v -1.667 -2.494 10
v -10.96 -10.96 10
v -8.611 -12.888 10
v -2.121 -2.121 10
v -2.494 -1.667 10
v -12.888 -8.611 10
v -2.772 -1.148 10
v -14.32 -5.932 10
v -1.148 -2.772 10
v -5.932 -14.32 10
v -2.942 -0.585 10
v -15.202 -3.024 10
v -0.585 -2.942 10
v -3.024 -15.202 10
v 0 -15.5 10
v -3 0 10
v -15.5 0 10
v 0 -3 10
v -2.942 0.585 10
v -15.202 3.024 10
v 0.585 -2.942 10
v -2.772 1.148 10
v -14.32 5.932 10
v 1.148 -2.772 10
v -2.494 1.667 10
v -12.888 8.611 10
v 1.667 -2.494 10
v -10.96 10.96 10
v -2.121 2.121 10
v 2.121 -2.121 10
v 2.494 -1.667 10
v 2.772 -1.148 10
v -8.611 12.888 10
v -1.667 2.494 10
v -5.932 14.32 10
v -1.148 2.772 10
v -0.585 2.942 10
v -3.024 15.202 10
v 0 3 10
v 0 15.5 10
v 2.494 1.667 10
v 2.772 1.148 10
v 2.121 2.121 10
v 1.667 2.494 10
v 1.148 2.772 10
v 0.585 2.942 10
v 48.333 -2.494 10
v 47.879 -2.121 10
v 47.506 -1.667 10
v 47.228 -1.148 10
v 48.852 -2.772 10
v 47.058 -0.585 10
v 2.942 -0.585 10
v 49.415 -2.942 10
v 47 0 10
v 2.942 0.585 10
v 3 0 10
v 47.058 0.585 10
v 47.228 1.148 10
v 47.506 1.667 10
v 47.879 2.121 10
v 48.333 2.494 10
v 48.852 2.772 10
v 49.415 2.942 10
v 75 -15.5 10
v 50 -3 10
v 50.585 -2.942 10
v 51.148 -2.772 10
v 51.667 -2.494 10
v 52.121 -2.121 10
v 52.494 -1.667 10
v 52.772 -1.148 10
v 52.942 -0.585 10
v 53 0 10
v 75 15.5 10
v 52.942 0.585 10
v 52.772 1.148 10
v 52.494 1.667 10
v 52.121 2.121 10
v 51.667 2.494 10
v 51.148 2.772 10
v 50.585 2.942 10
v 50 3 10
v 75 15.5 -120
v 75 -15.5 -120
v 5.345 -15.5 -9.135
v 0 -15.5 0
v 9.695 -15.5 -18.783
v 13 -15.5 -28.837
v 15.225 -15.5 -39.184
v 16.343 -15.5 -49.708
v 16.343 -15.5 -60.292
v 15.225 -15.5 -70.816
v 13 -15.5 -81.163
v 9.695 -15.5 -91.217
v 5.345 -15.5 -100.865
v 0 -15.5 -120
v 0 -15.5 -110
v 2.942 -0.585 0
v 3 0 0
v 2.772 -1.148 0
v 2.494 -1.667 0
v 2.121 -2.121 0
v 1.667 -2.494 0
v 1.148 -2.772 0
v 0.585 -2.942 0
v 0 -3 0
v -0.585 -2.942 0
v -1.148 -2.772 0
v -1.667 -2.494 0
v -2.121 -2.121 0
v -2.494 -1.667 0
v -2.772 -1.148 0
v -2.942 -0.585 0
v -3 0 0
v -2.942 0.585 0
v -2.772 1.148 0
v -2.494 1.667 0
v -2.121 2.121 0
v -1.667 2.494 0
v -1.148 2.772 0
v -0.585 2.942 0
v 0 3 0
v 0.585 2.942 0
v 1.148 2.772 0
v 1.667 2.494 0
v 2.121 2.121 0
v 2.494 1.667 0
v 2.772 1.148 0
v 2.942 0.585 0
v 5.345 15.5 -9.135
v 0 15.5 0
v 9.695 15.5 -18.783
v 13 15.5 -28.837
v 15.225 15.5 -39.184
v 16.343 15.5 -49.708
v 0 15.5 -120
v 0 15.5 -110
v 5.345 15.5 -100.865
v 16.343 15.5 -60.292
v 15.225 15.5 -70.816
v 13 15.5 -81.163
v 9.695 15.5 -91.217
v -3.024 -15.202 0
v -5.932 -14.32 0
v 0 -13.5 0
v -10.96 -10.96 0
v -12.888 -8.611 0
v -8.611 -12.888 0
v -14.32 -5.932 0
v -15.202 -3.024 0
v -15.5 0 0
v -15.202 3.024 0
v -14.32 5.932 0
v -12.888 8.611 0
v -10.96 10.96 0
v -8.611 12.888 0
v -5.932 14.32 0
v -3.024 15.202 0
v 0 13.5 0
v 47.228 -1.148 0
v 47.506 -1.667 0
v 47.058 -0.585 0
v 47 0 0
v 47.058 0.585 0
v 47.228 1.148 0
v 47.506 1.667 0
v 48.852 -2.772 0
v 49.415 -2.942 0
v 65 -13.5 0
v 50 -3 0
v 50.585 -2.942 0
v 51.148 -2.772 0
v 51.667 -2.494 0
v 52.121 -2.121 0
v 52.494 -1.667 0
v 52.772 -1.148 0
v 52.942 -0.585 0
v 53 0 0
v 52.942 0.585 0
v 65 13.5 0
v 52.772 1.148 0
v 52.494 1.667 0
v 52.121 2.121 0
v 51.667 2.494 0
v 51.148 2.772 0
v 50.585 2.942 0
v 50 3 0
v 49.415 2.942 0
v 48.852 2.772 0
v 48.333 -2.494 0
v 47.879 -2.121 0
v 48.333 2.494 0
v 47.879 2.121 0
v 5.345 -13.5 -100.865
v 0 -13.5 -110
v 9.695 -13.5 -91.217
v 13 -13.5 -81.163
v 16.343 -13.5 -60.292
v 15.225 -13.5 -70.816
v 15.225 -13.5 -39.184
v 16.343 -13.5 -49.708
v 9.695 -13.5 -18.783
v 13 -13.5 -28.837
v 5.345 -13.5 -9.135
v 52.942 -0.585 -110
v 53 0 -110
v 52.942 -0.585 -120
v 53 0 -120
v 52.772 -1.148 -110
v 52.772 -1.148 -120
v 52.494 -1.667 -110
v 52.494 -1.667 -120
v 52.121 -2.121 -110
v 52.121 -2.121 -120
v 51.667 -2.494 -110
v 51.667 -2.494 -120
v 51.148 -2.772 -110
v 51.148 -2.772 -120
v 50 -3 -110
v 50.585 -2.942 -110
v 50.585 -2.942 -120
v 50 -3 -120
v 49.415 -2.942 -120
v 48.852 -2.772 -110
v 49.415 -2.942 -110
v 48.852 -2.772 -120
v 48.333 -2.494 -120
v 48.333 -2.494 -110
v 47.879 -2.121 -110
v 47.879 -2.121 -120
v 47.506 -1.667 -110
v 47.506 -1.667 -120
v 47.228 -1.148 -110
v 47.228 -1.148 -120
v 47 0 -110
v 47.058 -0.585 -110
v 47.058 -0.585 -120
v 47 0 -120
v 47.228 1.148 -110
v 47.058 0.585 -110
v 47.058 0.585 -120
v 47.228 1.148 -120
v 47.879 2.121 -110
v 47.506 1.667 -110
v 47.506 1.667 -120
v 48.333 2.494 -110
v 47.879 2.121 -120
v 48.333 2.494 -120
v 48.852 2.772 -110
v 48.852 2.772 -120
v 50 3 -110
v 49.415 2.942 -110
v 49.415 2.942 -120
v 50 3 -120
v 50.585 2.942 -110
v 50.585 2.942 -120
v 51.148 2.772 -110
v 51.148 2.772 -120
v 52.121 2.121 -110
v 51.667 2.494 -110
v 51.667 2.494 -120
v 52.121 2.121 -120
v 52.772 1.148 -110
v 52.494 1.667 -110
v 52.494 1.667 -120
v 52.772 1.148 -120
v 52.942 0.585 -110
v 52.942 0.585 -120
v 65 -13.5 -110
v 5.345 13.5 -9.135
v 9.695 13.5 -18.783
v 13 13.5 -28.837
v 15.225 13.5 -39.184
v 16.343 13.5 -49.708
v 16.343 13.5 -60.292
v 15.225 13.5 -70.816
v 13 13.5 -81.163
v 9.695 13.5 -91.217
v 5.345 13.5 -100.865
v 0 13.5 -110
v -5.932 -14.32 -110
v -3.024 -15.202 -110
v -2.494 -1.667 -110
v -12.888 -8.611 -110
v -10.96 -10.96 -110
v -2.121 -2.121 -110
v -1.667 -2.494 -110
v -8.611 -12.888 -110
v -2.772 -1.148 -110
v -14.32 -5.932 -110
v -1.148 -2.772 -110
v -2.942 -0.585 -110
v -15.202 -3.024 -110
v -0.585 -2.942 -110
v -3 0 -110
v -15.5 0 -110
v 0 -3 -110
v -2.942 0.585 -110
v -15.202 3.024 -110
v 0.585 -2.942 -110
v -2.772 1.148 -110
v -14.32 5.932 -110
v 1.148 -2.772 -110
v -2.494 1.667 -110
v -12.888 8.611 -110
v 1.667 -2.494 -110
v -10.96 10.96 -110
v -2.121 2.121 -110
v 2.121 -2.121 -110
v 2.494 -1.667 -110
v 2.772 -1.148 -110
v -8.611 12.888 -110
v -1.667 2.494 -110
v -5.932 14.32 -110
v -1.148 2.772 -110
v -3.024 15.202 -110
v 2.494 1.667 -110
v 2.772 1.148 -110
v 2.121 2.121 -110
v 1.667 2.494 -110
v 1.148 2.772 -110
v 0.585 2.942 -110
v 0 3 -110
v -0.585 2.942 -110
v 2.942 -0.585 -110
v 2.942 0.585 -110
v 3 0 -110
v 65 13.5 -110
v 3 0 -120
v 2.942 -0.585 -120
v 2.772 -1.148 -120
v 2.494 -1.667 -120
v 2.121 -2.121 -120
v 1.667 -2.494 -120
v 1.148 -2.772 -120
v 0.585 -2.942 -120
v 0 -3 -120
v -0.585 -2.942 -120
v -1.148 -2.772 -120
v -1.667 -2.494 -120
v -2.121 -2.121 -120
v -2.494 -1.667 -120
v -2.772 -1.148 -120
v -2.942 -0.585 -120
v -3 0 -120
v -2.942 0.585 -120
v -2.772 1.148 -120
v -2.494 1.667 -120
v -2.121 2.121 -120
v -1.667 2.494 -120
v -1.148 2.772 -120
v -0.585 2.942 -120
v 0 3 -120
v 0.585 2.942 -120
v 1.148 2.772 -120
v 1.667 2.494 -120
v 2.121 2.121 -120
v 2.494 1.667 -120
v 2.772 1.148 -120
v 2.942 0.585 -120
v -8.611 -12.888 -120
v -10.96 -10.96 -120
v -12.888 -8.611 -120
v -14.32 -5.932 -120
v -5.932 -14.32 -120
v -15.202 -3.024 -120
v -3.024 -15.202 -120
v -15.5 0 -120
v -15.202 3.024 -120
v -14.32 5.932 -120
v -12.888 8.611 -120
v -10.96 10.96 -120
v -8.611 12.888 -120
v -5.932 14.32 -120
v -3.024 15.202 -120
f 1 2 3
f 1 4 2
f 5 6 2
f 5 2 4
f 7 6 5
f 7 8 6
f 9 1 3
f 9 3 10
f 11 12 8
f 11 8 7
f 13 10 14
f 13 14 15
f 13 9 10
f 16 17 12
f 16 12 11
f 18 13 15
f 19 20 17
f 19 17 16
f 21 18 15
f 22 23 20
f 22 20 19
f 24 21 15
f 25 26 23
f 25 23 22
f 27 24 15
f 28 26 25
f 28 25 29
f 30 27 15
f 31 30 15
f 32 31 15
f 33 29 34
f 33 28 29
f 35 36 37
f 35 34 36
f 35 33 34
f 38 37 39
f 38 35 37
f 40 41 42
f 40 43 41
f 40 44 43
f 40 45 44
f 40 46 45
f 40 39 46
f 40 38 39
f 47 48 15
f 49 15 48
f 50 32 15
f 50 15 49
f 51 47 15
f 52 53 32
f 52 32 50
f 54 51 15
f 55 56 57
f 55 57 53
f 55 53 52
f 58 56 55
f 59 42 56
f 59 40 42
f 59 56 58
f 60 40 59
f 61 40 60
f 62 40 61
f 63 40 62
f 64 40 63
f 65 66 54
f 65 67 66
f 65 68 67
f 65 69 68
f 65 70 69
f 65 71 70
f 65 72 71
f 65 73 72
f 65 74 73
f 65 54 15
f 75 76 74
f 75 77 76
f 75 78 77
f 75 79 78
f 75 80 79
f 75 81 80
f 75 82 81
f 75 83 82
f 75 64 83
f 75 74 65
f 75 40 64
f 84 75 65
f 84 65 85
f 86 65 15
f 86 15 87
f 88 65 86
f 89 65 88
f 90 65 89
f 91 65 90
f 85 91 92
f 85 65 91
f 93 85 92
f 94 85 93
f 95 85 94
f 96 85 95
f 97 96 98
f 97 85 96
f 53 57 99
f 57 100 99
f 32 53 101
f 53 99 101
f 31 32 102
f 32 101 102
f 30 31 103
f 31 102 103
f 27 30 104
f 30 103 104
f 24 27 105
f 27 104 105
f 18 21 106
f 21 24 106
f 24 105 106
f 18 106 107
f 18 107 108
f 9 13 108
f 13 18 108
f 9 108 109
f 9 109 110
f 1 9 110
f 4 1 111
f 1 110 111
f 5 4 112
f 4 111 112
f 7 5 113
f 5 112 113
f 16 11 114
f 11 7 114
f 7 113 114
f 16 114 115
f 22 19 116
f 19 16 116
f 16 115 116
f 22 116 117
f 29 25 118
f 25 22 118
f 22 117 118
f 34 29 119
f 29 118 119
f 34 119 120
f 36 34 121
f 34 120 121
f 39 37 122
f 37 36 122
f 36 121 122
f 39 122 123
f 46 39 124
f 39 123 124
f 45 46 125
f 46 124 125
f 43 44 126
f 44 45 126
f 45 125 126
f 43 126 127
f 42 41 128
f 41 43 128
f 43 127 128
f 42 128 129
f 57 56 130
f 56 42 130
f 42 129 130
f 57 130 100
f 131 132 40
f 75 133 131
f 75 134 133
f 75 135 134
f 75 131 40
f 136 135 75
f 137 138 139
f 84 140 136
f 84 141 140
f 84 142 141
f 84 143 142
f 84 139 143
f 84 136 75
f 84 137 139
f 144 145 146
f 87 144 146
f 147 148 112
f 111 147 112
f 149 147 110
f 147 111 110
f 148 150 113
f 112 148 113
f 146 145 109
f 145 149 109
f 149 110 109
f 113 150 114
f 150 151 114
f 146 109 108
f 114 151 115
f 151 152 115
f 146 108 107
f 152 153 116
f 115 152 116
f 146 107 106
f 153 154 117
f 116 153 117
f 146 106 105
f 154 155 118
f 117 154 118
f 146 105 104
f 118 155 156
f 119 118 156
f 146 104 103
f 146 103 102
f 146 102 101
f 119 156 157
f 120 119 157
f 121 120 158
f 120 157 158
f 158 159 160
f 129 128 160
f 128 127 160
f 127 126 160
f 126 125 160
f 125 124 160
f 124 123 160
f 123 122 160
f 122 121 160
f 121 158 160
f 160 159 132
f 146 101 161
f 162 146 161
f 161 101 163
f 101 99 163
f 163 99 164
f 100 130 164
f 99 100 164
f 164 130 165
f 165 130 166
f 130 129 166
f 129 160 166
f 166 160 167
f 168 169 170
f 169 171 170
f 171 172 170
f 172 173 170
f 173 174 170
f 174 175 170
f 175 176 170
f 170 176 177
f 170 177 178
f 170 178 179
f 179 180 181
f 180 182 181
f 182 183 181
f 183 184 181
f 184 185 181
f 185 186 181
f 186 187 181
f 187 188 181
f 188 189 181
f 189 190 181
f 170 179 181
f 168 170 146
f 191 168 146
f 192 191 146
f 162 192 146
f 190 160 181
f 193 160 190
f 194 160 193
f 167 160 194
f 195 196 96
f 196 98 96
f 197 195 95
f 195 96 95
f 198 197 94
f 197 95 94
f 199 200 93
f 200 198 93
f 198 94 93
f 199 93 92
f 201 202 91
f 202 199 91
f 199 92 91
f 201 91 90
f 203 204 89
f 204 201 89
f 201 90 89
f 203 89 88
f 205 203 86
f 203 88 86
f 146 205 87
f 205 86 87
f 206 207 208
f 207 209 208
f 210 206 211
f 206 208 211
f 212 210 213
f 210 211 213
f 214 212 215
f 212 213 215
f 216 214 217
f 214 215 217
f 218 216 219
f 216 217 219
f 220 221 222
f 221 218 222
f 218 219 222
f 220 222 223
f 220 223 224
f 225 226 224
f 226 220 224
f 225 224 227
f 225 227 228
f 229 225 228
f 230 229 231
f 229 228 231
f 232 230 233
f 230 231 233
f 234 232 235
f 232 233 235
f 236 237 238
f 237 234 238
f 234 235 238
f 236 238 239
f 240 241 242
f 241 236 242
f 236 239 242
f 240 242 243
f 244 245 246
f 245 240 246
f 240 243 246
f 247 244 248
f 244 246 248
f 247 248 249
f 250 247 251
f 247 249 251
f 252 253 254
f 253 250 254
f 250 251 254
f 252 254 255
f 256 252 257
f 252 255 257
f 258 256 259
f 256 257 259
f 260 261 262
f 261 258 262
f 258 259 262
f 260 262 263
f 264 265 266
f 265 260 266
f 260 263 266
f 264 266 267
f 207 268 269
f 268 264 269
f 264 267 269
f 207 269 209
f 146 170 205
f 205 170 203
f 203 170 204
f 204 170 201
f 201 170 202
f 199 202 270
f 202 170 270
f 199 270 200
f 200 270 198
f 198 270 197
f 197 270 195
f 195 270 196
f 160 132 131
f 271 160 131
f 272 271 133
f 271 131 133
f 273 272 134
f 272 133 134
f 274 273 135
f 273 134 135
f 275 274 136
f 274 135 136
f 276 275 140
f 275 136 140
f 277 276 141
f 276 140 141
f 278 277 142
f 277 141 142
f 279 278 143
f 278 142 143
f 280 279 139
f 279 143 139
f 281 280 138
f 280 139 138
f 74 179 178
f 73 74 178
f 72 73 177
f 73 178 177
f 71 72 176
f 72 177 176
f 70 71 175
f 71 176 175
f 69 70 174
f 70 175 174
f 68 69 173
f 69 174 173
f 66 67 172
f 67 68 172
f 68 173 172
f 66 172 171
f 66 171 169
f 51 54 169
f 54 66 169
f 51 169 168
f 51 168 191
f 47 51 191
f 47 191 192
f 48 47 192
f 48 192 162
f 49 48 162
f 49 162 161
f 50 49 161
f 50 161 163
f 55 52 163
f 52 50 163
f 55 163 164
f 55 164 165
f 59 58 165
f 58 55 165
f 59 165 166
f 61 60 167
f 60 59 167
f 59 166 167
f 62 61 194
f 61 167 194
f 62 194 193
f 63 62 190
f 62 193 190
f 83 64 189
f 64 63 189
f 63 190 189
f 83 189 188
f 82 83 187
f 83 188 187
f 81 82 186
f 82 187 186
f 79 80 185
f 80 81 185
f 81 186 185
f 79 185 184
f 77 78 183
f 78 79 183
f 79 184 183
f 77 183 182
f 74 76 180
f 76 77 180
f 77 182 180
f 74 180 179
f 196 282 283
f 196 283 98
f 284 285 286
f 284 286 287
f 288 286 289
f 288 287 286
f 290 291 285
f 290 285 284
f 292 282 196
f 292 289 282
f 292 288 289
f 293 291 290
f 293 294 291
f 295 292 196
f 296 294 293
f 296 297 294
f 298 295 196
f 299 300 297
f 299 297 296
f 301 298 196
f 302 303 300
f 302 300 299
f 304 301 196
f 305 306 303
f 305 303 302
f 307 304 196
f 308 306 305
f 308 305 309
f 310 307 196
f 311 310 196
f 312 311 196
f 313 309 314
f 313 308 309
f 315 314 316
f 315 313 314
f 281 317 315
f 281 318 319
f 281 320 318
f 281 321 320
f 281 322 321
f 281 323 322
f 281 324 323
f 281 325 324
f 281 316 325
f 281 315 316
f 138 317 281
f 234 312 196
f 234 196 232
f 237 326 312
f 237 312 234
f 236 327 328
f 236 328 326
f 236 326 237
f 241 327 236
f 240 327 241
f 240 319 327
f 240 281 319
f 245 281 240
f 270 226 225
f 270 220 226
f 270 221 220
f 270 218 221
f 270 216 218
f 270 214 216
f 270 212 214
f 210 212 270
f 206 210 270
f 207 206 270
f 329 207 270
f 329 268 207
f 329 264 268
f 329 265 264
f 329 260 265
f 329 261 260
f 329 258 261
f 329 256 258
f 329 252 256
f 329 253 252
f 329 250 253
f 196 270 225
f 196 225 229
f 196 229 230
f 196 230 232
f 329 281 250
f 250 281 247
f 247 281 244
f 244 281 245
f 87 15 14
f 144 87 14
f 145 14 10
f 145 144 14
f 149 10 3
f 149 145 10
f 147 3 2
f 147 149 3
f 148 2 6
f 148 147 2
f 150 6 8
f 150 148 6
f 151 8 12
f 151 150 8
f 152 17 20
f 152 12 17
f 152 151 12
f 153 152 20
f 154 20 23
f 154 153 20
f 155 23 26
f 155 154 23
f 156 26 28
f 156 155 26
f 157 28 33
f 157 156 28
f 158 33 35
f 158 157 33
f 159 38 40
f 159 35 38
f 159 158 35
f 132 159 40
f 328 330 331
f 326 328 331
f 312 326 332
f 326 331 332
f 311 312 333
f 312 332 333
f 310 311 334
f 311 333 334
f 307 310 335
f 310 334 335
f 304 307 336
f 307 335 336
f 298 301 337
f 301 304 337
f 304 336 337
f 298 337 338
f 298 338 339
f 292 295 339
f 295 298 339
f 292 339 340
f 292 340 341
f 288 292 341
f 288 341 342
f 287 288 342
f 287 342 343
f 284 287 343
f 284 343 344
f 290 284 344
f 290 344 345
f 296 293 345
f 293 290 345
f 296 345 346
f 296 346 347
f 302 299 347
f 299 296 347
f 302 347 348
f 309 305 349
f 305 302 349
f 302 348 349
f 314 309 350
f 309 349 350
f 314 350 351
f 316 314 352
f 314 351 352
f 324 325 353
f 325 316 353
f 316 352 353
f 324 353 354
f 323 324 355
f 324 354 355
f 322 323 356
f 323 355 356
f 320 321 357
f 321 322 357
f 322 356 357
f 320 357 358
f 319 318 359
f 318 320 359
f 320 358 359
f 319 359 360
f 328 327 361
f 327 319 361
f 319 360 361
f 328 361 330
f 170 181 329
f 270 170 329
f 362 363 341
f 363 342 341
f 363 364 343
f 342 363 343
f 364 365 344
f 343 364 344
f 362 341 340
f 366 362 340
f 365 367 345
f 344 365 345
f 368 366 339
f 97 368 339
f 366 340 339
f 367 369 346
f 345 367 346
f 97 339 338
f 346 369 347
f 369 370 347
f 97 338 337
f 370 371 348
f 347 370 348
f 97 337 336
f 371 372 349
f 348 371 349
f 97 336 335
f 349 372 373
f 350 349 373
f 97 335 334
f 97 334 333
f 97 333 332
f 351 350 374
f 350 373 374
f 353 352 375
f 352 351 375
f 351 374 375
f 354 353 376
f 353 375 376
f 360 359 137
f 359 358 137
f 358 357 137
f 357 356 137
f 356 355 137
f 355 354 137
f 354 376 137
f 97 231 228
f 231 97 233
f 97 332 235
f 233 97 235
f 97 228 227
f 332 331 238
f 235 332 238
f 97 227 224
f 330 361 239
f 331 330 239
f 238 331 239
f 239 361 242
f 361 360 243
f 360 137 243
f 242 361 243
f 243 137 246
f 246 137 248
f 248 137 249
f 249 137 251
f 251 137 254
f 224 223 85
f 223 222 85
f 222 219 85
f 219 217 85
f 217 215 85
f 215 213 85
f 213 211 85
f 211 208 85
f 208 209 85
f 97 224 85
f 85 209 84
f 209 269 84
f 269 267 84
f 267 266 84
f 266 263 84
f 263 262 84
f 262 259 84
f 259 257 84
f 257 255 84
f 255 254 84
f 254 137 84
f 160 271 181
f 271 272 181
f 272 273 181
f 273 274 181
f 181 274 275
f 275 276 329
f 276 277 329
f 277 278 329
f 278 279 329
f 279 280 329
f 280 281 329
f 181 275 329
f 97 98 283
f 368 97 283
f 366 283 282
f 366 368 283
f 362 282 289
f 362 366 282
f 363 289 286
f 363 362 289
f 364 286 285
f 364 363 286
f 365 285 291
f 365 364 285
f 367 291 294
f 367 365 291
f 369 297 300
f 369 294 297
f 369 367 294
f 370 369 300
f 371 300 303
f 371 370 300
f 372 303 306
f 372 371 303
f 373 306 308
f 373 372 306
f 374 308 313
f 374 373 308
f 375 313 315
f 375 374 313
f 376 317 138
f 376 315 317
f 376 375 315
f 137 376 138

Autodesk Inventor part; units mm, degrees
ref_plane "YZ Plane" through (0, 0, 0) normal (1, 0, 0) x (0, 1, 0)
ref_plane "XZ Plane" through (0, 0, 0) normal (0, 1, 0) x (-1, 0, 0)
ref_plane "XY Plane" through (0, 0, 0) normal (0, 0, 1) x (1, 0, 0)
sketch "Sketch1" plane through (0, 0, 0) normal (0, 0, 1) x (1, 0, 0)
  circle A0 centre (0, 0) radius 3
  circle A1 centre (50, 0) radius 3
  line L0 (0, 15.5) -> (65, 15.5)
  line L1 (65, 15.5) -> (65, -15.5)
  line L2 (65, -15.5) -> (0, -15.5)
  arc A2 (0, 15.5) -> (0, -15.5) centre (0, 0) ccw
  dimension "d0" = 6
  dimension "d2" = 50
  dimension "d3" = 15
  dimension "d4" = 31
extrude "Extrusion1" add sketch "Sketch1" along normal blind 10
sketch "Sketch2" plane through (65, -15.5, 0) normal (1, 0, 0) x (0, 0, -1)
  line L0 (-10, 0) -> (120, 0)
  line L1 (120, 0) -> (120, 31)
  line L2 (120, 31) -> (-10, 31)
  line L3 (-10, 31) -> (-10, 0)
  point P0 (0, 15.5)
  dimension "d7" = 130
extrude "Extrusion2" add sketch "Sketch2" along normal blind 10
pattern_linear "Rectangular Pattern1" count 2 spacing 120 along (0, 0, -1) of "Extrusion1"
sketch "Sketch3" plane through (0, 15.5, 10) normal (0, 1, 0) x (1, 0, 0)
  line L0 (0, 10) -> (65, 10) projected
  line L1 (65, 120) -> (0, 120) projected
  line L2 (65, 120) -> (65, 10) projected
  arc A0 (0, 10) -> (0, 120) centre (-83.5165, 65) ccw
  dimension "d13" = 100
extrude "Extrusion3" add sketch "Sketch3" against normal blind 2
mirror "Mirror1" about plane through (0, 0, 0) normal (0, 1, 0) of "Extrusion3"
properties part number "FRONT"
